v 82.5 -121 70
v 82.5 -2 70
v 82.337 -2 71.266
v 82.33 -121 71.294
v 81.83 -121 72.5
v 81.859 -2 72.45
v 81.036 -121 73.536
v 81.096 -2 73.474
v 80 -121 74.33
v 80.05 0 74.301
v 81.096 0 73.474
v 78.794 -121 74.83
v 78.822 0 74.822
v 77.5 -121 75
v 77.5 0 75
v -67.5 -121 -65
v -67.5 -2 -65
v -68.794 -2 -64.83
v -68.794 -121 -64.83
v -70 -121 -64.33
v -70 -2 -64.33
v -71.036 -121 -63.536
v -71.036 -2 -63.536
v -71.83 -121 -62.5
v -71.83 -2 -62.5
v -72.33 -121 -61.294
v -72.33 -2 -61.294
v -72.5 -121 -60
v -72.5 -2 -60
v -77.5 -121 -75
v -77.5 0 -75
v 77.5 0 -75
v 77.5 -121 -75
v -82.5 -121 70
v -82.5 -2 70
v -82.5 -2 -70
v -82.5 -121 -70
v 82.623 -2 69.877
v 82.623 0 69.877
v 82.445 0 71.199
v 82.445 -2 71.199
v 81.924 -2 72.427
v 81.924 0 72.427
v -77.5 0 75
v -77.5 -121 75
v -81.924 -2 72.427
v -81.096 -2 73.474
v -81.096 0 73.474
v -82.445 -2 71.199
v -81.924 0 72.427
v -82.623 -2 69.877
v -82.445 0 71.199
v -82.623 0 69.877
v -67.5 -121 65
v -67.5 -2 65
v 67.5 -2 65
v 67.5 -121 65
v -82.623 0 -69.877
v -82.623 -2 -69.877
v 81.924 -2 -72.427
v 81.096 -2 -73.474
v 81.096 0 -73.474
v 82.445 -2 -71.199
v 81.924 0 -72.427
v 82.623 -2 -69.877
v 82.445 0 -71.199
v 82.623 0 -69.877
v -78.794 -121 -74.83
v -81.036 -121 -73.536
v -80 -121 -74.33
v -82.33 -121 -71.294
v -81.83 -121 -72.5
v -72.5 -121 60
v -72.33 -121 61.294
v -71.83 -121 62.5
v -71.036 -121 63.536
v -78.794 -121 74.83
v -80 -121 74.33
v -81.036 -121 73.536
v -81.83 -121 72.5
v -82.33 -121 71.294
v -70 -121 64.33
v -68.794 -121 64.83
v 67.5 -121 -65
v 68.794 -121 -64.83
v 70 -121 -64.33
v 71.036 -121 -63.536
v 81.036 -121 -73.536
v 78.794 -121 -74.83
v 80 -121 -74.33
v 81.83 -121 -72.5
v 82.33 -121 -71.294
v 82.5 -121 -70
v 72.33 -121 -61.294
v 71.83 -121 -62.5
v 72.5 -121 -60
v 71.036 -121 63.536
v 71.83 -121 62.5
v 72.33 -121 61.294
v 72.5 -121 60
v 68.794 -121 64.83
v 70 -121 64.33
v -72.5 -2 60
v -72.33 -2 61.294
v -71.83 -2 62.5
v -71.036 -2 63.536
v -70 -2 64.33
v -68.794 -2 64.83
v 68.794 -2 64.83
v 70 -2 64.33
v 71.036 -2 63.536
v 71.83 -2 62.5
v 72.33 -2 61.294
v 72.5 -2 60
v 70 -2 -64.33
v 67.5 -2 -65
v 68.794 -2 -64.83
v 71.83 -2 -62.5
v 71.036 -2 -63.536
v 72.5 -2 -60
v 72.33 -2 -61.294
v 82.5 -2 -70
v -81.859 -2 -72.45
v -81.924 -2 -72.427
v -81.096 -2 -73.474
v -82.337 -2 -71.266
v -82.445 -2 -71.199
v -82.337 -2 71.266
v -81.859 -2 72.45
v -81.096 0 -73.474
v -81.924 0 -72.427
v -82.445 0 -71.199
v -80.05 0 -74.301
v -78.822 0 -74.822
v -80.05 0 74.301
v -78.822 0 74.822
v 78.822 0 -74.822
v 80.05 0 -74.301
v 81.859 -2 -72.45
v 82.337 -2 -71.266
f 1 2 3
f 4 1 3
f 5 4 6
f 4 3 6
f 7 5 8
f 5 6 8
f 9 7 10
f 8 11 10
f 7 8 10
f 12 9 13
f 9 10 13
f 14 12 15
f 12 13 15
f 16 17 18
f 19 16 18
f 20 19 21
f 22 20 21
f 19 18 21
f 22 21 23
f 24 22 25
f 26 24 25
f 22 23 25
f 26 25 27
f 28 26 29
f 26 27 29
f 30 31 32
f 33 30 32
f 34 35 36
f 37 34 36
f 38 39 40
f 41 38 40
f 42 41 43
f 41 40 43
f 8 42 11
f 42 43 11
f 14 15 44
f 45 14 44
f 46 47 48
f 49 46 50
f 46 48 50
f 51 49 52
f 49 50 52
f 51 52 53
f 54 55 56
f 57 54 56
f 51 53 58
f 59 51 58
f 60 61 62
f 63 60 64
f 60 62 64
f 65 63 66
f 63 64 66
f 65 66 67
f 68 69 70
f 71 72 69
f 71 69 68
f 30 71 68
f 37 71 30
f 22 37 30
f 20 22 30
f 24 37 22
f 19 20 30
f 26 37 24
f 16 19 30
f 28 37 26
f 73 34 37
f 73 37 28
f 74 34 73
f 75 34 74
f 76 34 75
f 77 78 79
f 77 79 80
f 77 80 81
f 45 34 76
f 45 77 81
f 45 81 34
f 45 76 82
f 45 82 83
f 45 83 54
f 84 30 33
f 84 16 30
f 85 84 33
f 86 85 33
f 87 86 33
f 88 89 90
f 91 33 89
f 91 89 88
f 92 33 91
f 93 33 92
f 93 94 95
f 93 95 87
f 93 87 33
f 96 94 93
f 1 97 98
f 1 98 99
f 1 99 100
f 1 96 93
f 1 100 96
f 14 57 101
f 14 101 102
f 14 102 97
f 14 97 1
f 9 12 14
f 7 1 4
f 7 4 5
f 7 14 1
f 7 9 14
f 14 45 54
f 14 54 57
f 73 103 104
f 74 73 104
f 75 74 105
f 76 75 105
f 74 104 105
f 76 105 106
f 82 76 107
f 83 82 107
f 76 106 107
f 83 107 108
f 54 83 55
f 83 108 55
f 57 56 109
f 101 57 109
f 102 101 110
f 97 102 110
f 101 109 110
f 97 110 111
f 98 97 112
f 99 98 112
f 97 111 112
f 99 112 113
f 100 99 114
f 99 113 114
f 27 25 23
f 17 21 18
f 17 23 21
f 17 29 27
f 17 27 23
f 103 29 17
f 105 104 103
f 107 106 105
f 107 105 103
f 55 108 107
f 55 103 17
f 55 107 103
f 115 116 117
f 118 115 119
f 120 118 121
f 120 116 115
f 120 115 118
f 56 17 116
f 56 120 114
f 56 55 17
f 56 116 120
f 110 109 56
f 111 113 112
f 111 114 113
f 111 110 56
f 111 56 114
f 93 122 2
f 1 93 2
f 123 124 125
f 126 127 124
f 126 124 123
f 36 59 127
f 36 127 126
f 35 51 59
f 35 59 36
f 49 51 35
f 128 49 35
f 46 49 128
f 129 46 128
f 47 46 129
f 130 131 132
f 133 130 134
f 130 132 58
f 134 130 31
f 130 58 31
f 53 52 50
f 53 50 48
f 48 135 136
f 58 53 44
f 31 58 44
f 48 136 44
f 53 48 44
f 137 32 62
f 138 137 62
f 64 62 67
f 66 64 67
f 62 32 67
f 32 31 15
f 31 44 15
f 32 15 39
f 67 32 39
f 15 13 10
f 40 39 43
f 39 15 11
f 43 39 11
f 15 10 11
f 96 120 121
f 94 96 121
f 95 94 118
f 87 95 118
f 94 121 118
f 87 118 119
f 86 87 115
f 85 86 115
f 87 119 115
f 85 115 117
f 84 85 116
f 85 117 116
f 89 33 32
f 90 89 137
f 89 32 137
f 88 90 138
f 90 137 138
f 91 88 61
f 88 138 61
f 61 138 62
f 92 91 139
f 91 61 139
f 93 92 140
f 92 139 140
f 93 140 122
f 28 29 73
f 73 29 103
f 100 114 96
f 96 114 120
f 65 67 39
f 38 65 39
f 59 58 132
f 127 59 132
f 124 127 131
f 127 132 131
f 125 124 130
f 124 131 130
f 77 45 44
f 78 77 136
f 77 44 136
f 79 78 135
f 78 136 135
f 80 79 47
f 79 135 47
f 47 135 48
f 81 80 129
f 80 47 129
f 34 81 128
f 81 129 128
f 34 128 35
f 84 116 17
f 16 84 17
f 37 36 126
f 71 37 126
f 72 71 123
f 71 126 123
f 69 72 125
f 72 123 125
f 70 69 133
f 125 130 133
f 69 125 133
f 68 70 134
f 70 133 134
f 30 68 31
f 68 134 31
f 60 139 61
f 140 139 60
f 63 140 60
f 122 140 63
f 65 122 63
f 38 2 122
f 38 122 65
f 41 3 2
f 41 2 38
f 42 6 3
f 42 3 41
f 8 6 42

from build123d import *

# Parameters (mm, degrees)
F1_DEPTH = 121
F3_DEPTH = 2


with BuildPart() as f1:
    # F0 (on Front) → F1 (new body)
    with BuildSketch(Plane.XZ):
        with BuildLine():
            Line((77.5, 75), (-77.5, 75))
            ThreePointArc((-77.5, 75), (-81.035534, 73.535534), (-82.5, 70))
            Line((-82.5, 70), (-82.5, -70))
            ThreePointArc((-82.5, -70), (-81.035534, -73.535534), (-77.5, -75))
            Line((-77.5, -75), (77.5, -75))
            ThreePointArc((77.5, -75), (81.035534, -73.535534), (82.5, -70))
            Line((82.5, -70), (82.5, 70))
            ThreePointArc((82.5, 70), (81.035534, 73.535534), (77.5, 75))
        make_face()
        with BuildLine():
            ThreePointArc((-72.5, 60), (-71.035534, 63.535534), (-67.5, 65))
            Line((-67.5, 65), (67.5, 65))
            ThreePointArc((67.5, 65), (71.035534, 63.535534), (72.5, 60))
            Line((72.5, 60), (72.5, -60))
            ThreePointArc((72.5, -60), (71.035534, -63.535534), (67.5, -65))
            Line((67.5, -65), (-67.5, -65))
            ThreePointArc((-67.5, -65), (-71.035534, -63.535534), (-72.5, -60))
            Line((-72.5, -60), (-72.5, 60))
        make_face(mode=Mode.SUBTRACT)
    extrude(amount=F1_DEPTH)

    # F2 (on Front) → F3 (join)
    with BuildSketch(Plane.XZ):
        with BuildLine():
            Line((77.622953, 74.877053), (-77.622953, 74.877053))
            ThreePointArc((-77.622953, 74.877053), (-81.158487, 73.412587), (-82.622953, 69.877053))
            Line((-82.622953, 69.877053), (-82.622953, -69.877053))
            ThreePointArc((-82.622953, -69.877053), (-81.158487, -73.412587), (-77.622953, -74.877053))
            Line((-77.622953, -74.877053), (77.622953, -74.877053))
            ThreePointArc((77.622953, -74.877053), (81.158487, -73.412587), (82.622953, -69.877053))
            Line((82.622953, -69.877053), (82.622953, 69.877053))
            ThreePointArc((82.622953, 69.877053), (81.158487, 73.412587), (77.622953, 74.877053))
        make_face()
    extrude(amount=F3_DEPTH)


solid = f1.part
